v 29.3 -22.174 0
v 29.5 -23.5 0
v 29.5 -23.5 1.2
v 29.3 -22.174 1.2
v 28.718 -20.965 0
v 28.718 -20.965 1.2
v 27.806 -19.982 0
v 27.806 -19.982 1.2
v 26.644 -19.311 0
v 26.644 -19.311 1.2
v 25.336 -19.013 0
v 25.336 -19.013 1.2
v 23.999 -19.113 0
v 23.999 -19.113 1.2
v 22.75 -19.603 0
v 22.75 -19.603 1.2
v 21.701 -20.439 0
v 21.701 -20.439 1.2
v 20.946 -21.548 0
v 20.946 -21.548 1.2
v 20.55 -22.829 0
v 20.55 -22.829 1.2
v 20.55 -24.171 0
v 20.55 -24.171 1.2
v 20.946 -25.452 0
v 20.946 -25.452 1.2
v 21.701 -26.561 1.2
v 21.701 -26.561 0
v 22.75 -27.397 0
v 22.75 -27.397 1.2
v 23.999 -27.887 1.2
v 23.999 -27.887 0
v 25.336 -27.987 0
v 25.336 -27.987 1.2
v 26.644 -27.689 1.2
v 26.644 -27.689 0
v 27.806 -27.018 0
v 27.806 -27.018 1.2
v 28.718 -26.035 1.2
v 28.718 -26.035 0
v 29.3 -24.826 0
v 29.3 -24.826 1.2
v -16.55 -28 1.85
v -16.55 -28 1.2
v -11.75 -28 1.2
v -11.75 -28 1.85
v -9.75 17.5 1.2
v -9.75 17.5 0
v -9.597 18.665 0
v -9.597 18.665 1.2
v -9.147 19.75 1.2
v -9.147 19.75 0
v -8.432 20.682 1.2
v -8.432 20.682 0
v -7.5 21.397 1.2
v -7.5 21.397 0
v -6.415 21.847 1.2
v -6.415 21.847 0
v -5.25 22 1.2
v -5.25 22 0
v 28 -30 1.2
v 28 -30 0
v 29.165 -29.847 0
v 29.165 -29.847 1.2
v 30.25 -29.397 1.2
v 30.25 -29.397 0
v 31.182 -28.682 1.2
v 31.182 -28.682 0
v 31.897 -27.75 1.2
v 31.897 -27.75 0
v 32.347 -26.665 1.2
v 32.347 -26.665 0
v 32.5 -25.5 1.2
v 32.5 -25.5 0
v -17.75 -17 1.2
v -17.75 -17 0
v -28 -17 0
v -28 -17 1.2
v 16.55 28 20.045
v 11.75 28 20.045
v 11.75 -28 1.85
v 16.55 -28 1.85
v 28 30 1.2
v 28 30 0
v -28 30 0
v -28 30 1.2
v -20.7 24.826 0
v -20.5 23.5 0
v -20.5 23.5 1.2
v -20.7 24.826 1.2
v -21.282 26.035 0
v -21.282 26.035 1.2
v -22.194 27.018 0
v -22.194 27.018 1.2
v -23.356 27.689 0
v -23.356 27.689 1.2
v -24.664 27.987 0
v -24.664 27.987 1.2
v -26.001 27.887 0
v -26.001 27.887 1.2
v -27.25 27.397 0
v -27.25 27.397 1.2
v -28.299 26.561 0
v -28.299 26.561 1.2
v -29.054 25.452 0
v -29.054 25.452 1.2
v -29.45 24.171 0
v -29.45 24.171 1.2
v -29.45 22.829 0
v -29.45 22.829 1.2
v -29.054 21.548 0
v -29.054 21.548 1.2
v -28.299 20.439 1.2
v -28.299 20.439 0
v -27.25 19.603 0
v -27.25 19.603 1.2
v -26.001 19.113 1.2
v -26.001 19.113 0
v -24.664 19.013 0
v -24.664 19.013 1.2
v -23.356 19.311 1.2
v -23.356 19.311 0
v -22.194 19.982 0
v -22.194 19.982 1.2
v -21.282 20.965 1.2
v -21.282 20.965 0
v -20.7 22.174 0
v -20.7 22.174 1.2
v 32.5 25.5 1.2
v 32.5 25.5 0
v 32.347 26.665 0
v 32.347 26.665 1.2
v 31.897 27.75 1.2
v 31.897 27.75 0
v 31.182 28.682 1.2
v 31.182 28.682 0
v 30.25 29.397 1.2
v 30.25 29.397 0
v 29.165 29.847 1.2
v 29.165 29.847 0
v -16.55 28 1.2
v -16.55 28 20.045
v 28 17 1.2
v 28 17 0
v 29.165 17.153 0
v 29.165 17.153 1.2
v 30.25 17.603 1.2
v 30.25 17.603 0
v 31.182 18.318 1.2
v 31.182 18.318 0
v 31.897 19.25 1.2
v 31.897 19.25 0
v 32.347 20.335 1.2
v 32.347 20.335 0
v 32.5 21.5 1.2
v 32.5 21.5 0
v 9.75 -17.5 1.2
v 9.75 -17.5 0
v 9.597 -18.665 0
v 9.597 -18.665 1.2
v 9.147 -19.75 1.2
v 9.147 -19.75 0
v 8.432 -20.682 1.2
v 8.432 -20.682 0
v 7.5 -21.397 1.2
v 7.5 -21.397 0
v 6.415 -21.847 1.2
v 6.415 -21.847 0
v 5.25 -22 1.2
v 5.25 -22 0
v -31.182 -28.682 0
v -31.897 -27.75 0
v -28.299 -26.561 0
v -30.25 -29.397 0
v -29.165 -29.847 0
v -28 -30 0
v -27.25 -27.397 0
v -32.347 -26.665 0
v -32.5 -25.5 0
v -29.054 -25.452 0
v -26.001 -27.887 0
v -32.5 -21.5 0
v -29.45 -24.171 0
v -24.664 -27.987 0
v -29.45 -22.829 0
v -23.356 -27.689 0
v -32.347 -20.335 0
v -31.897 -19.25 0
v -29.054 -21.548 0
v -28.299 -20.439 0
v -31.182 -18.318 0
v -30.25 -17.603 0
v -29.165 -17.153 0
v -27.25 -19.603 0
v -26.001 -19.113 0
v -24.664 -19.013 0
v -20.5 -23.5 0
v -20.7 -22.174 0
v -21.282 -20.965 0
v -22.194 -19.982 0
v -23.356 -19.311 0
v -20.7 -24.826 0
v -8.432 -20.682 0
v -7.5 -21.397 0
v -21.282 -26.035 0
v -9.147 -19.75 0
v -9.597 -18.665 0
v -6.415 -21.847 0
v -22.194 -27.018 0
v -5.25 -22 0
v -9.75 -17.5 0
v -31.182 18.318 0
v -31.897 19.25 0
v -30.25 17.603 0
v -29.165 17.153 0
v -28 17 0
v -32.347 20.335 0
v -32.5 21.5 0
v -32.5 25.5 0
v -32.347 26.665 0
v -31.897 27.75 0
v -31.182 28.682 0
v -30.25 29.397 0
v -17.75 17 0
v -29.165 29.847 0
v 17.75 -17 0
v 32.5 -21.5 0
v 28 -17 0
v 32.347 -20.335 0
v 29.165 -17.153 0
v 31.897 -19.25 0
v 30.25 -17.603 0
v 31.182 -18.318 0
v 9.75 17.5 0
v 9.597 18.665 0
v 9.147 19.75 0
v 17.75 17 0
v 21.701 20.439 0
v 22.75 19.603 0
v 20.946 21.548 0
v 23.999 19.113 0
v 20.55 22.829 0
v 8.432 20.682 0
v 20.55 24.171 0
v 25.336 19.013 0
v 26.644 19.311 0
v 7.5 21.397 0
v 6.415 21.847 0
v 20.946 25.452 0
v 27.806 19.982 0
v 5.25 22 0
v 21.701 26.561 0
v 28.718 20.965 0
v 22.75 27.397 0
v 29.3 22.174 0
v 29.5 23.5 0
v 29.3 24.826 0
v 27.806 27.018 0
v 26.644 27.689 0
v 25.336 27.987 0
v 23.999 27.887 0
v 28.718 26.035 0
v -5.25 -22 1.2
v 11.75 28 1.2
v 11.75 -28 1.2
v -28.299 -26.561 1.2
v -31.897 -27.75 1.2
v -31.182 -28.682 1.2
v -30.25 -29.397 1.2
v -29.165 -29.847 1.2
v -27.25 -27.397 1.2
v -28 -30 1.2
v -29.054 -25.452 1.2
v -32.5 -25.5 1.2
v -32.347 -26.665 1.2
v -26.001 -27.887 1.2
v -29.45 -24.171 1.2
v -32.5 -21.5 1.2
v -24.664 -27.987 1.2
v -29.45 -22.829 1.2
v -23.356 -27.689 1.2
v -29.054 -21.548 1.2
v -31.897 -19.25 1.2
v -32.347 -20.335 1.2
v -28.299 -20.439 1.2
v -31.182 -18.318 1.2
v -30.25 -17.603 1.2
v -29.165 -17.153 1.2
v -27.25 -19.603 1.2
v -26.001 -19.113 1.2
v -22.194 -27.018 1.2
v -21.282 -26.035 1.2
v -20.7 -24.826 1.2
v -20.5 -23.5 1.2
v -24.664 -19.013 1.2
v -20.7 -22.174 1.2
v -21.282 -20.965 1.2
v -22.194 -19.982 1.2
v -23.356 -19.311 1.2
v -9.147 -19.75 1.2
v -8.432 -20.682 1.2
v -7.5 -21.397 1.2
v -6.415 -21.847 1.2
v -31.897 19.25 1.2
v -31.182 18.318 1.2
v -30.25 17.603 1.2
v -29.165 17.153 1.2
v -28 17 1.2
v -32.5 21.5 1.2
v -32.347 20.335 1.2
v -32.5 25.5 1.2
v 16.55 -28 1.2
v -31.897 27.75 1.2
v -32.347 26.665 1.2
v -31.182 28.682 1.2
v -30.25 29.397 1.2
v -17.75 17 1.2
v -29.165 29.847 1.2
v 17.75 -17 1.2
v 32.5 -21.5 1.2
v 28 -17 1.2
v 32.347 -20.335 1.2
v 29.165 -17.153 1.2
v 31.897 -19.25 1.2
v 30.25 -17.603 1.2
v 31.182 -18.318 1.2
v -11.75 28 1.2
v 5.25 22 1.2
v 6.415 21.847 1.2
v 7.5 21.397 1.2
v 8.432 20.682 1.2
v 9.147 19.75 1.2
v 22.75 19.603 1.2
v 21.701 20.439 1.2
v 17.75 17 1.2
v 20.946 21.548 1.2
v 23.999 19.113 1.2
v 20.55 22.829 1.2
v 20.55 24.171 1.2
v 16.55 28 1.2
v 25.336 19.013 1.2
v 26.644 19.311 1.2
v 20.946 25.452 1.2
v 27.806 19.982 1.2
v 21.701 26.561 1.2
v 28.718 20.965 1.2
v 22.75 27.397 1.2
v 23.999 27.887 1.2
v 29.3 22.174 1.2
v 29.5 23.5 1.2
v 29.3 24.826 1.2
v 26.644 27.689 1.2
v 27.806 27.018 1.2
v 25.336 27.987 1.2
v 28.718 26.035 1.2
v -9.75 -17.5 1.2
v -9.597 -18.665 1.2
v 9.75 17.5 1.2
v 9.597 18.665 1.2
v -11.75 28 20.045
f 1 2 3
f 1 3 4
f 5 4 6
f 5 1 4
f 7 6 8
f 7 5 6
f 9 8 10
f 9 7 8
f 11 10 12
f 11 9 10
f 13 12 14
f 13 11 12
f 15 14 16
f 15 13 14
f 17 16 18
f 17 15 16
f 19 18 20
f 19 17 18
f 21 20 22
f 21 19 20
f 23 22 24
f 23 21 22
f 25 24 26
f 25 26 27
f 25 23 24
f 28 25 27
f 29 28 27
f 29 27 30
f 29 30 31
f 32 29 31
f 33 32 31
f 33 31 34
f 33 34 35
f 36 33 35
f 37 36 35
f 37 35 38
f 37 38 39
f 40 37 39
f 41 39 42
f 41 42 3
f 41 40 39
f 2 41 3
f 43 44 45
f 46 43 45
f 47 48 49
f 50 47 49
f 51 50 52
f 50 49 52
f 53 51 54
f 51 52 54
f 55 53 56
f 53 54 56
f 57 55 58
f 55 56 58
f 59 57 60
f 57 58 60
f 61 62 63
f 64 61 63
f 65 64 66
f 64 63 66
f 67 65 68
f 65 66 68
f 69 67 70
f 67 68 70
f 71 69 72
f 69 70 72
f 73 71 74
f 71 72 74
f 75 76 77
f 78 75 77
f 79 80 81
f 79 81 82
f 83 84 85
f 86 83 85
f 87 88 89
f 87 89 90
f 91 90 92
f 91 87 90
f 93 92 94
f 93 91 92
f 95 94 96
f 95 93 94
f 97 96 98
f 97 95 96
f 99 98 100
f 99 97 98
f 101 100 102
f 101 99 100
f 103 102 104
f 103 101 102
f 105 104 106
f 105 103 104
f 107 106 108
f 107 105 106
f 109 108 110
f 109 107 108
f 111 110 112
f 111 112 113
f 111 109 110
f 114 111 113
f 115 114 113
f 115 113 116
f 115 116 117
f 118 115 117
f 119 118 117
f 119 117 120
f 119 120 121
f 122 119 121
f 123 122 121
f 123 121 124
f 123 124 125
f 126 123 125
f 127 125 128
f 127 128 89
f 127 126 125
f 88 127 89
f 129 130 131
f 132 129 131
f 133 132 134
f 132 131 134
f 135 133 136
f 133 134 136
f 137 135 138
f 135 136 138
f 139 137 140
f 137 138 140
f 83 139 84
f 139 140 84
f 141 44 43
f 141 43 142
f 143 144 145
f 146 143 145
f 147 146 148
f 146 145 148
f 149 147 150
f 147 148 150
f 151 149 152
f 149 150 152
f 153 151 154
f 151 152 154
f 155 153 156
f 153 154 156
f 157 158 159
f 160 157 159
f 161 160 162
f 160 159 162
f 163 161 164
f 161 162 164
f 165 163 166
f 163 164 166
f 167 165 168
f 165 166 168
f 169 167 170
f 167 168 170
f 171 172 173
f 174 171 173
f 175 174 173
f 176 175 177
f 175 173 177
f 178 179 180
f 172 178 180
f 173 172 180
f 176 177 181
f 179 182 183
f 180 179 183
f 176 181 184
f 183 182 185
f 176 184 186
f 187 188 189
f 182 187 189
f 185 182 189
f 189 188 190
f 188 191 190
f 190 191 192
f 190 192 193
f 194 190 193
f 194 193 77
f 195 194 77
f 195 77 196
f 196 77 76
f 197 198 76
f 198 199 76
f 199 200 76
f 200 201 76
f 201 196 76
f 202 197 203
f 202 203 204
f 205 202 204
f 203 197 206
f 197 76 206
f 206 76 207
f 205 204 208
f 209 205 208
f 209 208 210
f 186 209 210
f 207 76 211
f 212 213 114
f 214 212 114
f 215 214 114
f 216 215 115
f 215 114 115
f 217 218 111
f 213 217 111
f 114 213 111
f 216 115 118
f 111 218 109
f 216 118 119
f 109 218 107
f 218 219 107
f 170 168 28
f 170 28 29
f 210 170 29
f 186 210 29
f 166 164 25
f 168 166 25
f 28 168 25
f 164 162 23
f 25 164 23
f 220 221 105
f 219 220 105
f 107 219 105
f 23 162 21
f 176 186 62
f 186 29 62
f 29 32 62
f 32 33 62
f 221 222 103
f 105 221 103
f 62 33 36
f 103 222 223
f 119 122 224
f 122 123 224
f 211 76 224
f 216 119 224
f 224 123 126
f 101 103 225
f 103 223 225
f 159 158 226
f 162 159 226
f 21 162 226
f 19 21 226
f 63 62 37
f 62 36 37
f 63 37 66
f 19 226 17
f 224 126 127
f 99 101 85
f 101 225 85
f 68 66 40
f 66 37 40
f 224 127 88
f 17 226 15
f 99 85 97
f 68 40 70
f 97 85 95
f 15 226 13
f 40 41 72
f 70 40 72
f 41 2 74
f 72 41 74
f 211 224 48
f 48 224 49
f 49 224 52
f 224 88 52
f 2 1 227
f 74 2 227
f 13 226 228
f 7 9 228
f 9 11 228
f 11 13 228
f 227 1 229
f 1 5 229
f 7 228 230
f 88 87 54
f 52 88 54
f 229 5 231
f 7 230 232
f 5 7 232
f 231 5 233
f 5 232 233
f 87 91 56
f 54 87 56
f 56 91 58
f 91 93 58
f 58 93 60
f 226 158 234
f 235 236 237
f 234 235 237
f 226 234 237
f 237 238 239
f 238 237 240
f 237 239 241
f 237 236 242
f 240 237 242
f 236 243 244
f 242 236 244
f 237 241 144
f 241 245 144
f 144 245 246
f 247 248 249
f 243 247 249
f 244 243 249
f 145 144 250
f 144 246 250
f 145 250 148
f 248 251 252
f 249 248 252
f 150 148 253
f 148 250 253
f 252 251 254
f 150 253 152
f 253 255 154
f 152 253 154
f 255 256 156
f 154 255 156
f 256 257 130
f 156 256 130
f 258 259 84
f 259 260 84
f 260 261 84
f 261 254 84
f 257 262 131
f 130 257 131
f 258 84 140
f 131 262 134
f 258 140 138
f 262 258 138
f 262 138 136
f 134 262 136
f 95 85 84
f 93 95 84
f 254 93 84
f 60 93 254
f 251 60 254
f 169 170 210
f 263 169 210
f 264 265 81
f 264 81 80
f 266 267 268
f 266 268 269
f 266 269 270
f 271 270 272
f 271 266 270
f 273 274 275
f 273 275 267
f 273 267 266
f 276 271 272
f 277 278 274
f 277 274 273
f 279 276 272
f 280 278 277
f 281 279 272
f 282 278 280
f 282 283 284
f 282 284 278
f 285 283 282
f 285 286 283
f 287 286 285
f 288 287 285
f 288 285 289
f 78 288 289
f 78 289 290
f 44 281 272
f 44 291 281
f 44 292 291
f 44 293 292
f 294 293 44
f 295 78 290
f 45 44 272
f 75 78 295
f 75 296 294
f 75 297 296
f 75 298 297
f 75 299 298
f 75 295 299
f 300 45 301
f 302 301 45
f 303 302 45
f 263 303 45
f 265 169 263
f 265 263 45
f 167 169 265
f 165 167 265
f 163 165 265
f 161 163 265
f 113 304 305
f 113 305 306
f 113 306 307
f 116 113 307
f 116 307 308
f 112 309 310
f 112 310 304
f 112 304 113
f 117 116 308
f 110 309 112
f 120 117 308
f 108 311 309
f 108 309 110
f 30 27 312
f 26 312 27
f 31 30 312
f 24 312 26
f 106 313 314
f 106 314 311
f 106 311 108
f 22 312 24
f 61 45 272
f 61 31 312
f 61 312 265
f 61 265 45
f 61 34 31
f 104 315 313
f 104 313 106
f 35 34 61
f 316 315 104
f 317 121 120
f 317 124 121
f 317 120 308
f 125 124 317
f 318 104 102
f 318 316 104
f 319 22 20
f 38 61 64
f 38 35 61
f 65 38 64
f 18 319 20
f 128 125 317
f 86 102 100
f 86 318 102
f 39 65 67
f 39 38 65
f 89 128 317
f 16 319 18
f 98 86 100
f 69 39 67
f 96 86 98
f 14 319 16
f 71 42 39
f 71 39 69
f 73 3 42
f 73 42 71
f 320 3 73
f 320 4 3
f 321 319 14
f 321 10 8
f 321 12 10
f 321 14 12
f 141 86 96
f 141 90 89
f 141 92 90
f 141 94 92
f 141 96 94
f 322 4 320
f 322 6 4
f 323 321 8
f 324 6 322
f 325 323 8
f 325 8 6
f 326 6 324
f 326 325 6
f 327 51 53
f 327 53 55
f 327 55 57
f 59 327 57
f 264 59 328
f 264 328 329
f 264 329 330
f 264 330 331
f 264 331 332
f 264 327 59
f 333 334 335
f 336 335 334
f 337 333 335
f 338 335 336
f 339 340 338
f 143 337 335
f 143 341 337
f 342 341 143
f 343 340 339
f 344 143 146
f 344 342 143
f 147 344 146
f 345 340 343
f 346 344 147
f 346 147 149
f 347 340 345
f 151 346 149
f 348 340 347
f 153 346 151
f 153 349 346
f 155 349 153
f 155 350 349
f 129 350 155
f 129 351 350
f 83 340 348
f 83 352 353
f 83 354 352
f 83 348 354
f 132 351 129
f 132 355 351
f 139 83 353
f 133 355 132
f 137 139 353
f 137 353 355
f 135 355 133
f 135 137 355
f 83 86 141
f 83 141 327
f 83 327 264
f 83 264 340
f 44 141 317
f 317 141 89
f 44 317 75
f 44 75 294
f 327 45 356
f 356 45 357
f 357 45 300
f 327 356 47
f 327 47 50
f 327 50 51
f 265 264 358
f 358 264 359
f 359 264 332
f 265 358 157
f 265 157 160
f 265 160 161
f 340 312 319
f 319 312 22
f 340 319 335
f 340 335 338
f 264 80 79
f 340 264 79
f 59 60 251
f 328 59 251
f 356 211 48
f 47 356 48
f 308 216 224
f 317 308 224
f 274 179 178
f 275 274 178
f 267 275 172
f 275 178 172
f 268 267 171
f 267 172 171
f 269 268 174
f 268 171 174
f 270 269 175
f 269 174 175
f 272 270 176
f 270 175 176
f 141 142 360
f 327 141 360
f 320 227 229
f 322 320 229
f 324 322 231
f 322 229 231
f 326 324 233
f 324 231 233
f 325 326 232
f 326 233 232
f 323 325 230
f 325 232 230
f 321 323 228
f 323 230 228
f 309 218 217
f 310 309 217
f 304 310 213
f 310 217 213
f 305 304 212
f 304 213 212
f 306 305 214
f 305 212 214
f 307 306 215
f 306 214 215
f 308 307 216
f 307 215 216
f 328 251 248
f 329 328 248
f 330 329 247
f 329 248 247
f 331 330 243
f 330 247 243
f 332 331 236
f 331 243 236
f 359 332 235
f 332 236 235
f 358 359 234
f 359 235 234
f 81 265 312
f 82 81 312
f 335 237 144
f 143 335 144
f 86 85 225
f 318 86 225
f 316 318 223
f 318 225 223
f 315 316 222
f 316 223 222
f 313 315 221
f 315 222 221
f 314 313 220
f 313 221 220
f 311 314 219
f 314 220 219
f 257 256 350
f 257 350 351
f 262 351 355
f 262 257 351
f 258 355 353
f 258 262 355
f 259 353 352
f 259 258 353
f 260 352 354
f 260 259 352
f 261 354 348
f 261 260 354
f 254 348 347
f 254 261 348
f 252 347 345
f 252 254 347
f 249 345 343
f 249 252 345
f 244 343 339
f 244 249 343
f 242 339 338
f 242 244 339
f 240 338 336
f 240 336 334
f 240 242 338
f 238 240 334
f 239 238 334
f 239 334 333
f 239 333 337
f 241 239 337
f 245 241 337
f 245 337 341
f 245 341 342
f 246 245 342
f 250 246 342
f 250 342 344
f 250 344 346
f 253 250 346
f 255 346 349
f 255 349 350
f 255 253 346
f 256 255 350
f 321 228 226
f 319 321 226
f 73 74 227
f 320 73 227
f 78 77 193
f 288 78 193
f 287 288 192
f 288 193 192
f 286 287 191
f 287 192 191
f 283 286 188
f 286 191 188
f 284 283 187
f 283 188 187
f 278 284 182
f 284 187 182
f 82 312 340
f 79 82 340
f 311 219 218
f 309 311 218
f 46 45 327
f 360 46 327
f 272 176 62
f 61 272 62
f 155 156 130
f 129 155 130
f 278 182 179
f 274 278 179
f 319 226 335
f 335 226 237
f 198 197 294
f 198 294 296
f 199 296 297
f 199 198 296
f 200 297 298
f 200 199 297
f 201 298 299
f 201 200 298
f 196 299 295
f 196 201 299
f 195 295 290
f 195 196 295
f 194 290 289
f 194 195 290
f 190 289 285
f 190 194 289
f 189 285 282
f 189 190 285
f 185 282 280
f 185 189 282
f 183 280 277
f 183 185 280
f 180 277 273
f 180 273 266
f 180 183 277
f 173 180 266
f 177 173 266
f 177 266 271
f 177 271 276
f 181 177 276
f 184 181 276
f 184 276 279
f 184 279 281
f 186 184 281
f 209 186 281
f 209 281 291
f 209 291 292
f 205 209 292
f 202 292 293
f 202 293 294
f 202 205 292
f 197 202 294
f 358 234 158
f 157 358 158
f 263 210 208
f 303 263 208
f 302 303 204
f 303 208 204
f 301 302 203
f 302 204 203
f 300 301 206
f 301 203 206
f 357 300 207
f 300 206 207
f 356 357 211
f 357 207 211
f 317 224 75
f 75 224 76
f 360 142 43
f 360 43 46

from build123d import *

# Parameters (mm, degrees)
F0_R     = 4.5
F0_W     = 8
F0_H     = 34
F1_DEPTH = 1.2
F2_W     = 4.8
F2_H     = 56
F3_DEPTH = 25
F5_W     = 101.632081
F5_H     = 108.945377
F6_DEPTH = 50


with BuildPart() as f1:
    # F0 (on Top) → F1 (new body)
    with BuildSketch(Plane.XY):
        with BuildLine():
            Line((17.75, 17), (17.75, 30))
            Line((17.75, 30), (-17.75, 30))
            Line((-17.75, 30), (-17.75, 17))
            Line((-17.75, 17), (-9.75, 17))
            Line((-9.75, 17), (-9.75, 17.5))
            ThreePointArc((-9.75, 17.5), (-8.431981, 20.681981), (-5.25, 22))
            Line((-5.25, 22), (5.25, 22))
            ThreePointArc((5.25, 22), (8.431981, 20.681981), (9.75, 17.5))
            Line((9.75, 17.5), (9.75, 17))
            Line((9.75, 17), (17.75, 17))
        make_face()
        with BuildLine():
            Line((28, 30), (17.75, 30))
            Line((17.75, 30), (17.75, 17))
            Line((17.75, 17), (28, 17))
            ThreePointArc((28, 17), (31.181981, 18.318019), (32.5, 21.5))
            Line((32.5, 21.5), (32.5, 25.5))
            ThreePointArc((32.5, 25.5), (31.181981, 28.681981), (28, 30))
        make_face()
        with Locations((25, 23.5)):
            Circle(F0_R, mode=Mode.SUBTRACT)
        with BuildLine():
            Line((-17.75, 17), (-17.75, 30))
            Line((-17.75, 30), (-28, 30))
            ThreePointArc((-28, 30), (-31.181981, 28.681981), (-32.5, 25.5))
            Line((-32.5, 25.5), (-32.5, 21.5))
            ThreePointArc((-32.5, 21.5), (-31.181981, 18.318019), (-28, 17))
            Line((-28, 17), (-17.75, 17))
        make_face()
        with Locations((-25, 23.5)):
            Circle(F0_R, mode=Mode.SUBTRACT)
        with Locations((13.75, 0)):
            Rectangle(F0_W, F0_H)
        with Locations((-13.75, 0)):
            Rectangle(F0_W, F0_H)
        with BuildLine():
            Line((28, -17), (17.75, -17))
            Line((17.75, -17), (17.75, -30))
            Line((17.75, -30), (28, -30))
            ThreePointArc((28, -30), (31.181981, -28.681981), (32.5, -25.5))
            Line((32.5, -25.5), (32.5, -21.5))
            ThreePointArc((32.5, -21.5), (31.181981, -18.318019), (28, -17))
        make_face()
        with Locations((25, -23.5)):
            Circle(F0_R, mode=Mode.SUBTRACT)
        with BuildLine():
            Line((17.75, -30), (17.75, -17))
            Line((17.75, -17), (9.75, -17))
            Line((9.75, -17), (9.75, -17.5))
            ThreePointArc((9.75, -17.5), (8.431981, -20.681981), (5.25, -22))
            Line((5.25, -22), (-5.25, -22))
            ThreePointArc((-5.25, -22), (-8.431981, -20.681981), (-9.75, -17.5))
            Line((-9.75, -17.5), (-9.75, -17))
            Line((-9.75, -17), (-17.75, -17))
            Line((-17.75, -17), (-17.75, -30))
            Line((-17.75, -30), (17.75, -30))
        make_face()
        with BuildLine():
            Line((-17.75, -30), (-17.75, -17))
            Line((-17.75, -17), (-28, -17))
            ThreePointArc((-28, -17), (-31.181981, -18.318019), (-32.5, -21.5))
            Line((-32.5, -21.5), (-32.5, -25.5))
            ThreePointArc((-32.5, -25.5), (-31.181981, -28.681981), (-28, -30))
            Line((-28, -30), (-17.75, -30))
        make_face()
        with Locations((-25, -23.5)):
            Circle(F0_R, mode=Mode.SUBTRACT)
    extrude(amount=F1_DEPTH)

    # F2 (on face) → F3 (join)
    with BuildSketch(Plane.XY.offset(1.2)):
        with Locations((14.15, 0)):
            Rectangle(F2_W, F2_H)
        with Locations((-14.15, 0)):
            Rectangle(F2_W, F2_H)
    extrude(amount=F3_DEPTH)

    # F5 (on face) → F6 (cut)
    with BuildSketch(Plane(origin=(0, -3.217416, 9.902189), x_dir=(1, 0, 0), z_dir=(0, -0.309017, 0.951057))):
        with Locations((3.367923, -6.511665)):
            Rectangle(F5_W, F5_H)
    extrude(amount=F6_DEPTH, mode=Mode.SUBTRACT)


solid = f1.part
